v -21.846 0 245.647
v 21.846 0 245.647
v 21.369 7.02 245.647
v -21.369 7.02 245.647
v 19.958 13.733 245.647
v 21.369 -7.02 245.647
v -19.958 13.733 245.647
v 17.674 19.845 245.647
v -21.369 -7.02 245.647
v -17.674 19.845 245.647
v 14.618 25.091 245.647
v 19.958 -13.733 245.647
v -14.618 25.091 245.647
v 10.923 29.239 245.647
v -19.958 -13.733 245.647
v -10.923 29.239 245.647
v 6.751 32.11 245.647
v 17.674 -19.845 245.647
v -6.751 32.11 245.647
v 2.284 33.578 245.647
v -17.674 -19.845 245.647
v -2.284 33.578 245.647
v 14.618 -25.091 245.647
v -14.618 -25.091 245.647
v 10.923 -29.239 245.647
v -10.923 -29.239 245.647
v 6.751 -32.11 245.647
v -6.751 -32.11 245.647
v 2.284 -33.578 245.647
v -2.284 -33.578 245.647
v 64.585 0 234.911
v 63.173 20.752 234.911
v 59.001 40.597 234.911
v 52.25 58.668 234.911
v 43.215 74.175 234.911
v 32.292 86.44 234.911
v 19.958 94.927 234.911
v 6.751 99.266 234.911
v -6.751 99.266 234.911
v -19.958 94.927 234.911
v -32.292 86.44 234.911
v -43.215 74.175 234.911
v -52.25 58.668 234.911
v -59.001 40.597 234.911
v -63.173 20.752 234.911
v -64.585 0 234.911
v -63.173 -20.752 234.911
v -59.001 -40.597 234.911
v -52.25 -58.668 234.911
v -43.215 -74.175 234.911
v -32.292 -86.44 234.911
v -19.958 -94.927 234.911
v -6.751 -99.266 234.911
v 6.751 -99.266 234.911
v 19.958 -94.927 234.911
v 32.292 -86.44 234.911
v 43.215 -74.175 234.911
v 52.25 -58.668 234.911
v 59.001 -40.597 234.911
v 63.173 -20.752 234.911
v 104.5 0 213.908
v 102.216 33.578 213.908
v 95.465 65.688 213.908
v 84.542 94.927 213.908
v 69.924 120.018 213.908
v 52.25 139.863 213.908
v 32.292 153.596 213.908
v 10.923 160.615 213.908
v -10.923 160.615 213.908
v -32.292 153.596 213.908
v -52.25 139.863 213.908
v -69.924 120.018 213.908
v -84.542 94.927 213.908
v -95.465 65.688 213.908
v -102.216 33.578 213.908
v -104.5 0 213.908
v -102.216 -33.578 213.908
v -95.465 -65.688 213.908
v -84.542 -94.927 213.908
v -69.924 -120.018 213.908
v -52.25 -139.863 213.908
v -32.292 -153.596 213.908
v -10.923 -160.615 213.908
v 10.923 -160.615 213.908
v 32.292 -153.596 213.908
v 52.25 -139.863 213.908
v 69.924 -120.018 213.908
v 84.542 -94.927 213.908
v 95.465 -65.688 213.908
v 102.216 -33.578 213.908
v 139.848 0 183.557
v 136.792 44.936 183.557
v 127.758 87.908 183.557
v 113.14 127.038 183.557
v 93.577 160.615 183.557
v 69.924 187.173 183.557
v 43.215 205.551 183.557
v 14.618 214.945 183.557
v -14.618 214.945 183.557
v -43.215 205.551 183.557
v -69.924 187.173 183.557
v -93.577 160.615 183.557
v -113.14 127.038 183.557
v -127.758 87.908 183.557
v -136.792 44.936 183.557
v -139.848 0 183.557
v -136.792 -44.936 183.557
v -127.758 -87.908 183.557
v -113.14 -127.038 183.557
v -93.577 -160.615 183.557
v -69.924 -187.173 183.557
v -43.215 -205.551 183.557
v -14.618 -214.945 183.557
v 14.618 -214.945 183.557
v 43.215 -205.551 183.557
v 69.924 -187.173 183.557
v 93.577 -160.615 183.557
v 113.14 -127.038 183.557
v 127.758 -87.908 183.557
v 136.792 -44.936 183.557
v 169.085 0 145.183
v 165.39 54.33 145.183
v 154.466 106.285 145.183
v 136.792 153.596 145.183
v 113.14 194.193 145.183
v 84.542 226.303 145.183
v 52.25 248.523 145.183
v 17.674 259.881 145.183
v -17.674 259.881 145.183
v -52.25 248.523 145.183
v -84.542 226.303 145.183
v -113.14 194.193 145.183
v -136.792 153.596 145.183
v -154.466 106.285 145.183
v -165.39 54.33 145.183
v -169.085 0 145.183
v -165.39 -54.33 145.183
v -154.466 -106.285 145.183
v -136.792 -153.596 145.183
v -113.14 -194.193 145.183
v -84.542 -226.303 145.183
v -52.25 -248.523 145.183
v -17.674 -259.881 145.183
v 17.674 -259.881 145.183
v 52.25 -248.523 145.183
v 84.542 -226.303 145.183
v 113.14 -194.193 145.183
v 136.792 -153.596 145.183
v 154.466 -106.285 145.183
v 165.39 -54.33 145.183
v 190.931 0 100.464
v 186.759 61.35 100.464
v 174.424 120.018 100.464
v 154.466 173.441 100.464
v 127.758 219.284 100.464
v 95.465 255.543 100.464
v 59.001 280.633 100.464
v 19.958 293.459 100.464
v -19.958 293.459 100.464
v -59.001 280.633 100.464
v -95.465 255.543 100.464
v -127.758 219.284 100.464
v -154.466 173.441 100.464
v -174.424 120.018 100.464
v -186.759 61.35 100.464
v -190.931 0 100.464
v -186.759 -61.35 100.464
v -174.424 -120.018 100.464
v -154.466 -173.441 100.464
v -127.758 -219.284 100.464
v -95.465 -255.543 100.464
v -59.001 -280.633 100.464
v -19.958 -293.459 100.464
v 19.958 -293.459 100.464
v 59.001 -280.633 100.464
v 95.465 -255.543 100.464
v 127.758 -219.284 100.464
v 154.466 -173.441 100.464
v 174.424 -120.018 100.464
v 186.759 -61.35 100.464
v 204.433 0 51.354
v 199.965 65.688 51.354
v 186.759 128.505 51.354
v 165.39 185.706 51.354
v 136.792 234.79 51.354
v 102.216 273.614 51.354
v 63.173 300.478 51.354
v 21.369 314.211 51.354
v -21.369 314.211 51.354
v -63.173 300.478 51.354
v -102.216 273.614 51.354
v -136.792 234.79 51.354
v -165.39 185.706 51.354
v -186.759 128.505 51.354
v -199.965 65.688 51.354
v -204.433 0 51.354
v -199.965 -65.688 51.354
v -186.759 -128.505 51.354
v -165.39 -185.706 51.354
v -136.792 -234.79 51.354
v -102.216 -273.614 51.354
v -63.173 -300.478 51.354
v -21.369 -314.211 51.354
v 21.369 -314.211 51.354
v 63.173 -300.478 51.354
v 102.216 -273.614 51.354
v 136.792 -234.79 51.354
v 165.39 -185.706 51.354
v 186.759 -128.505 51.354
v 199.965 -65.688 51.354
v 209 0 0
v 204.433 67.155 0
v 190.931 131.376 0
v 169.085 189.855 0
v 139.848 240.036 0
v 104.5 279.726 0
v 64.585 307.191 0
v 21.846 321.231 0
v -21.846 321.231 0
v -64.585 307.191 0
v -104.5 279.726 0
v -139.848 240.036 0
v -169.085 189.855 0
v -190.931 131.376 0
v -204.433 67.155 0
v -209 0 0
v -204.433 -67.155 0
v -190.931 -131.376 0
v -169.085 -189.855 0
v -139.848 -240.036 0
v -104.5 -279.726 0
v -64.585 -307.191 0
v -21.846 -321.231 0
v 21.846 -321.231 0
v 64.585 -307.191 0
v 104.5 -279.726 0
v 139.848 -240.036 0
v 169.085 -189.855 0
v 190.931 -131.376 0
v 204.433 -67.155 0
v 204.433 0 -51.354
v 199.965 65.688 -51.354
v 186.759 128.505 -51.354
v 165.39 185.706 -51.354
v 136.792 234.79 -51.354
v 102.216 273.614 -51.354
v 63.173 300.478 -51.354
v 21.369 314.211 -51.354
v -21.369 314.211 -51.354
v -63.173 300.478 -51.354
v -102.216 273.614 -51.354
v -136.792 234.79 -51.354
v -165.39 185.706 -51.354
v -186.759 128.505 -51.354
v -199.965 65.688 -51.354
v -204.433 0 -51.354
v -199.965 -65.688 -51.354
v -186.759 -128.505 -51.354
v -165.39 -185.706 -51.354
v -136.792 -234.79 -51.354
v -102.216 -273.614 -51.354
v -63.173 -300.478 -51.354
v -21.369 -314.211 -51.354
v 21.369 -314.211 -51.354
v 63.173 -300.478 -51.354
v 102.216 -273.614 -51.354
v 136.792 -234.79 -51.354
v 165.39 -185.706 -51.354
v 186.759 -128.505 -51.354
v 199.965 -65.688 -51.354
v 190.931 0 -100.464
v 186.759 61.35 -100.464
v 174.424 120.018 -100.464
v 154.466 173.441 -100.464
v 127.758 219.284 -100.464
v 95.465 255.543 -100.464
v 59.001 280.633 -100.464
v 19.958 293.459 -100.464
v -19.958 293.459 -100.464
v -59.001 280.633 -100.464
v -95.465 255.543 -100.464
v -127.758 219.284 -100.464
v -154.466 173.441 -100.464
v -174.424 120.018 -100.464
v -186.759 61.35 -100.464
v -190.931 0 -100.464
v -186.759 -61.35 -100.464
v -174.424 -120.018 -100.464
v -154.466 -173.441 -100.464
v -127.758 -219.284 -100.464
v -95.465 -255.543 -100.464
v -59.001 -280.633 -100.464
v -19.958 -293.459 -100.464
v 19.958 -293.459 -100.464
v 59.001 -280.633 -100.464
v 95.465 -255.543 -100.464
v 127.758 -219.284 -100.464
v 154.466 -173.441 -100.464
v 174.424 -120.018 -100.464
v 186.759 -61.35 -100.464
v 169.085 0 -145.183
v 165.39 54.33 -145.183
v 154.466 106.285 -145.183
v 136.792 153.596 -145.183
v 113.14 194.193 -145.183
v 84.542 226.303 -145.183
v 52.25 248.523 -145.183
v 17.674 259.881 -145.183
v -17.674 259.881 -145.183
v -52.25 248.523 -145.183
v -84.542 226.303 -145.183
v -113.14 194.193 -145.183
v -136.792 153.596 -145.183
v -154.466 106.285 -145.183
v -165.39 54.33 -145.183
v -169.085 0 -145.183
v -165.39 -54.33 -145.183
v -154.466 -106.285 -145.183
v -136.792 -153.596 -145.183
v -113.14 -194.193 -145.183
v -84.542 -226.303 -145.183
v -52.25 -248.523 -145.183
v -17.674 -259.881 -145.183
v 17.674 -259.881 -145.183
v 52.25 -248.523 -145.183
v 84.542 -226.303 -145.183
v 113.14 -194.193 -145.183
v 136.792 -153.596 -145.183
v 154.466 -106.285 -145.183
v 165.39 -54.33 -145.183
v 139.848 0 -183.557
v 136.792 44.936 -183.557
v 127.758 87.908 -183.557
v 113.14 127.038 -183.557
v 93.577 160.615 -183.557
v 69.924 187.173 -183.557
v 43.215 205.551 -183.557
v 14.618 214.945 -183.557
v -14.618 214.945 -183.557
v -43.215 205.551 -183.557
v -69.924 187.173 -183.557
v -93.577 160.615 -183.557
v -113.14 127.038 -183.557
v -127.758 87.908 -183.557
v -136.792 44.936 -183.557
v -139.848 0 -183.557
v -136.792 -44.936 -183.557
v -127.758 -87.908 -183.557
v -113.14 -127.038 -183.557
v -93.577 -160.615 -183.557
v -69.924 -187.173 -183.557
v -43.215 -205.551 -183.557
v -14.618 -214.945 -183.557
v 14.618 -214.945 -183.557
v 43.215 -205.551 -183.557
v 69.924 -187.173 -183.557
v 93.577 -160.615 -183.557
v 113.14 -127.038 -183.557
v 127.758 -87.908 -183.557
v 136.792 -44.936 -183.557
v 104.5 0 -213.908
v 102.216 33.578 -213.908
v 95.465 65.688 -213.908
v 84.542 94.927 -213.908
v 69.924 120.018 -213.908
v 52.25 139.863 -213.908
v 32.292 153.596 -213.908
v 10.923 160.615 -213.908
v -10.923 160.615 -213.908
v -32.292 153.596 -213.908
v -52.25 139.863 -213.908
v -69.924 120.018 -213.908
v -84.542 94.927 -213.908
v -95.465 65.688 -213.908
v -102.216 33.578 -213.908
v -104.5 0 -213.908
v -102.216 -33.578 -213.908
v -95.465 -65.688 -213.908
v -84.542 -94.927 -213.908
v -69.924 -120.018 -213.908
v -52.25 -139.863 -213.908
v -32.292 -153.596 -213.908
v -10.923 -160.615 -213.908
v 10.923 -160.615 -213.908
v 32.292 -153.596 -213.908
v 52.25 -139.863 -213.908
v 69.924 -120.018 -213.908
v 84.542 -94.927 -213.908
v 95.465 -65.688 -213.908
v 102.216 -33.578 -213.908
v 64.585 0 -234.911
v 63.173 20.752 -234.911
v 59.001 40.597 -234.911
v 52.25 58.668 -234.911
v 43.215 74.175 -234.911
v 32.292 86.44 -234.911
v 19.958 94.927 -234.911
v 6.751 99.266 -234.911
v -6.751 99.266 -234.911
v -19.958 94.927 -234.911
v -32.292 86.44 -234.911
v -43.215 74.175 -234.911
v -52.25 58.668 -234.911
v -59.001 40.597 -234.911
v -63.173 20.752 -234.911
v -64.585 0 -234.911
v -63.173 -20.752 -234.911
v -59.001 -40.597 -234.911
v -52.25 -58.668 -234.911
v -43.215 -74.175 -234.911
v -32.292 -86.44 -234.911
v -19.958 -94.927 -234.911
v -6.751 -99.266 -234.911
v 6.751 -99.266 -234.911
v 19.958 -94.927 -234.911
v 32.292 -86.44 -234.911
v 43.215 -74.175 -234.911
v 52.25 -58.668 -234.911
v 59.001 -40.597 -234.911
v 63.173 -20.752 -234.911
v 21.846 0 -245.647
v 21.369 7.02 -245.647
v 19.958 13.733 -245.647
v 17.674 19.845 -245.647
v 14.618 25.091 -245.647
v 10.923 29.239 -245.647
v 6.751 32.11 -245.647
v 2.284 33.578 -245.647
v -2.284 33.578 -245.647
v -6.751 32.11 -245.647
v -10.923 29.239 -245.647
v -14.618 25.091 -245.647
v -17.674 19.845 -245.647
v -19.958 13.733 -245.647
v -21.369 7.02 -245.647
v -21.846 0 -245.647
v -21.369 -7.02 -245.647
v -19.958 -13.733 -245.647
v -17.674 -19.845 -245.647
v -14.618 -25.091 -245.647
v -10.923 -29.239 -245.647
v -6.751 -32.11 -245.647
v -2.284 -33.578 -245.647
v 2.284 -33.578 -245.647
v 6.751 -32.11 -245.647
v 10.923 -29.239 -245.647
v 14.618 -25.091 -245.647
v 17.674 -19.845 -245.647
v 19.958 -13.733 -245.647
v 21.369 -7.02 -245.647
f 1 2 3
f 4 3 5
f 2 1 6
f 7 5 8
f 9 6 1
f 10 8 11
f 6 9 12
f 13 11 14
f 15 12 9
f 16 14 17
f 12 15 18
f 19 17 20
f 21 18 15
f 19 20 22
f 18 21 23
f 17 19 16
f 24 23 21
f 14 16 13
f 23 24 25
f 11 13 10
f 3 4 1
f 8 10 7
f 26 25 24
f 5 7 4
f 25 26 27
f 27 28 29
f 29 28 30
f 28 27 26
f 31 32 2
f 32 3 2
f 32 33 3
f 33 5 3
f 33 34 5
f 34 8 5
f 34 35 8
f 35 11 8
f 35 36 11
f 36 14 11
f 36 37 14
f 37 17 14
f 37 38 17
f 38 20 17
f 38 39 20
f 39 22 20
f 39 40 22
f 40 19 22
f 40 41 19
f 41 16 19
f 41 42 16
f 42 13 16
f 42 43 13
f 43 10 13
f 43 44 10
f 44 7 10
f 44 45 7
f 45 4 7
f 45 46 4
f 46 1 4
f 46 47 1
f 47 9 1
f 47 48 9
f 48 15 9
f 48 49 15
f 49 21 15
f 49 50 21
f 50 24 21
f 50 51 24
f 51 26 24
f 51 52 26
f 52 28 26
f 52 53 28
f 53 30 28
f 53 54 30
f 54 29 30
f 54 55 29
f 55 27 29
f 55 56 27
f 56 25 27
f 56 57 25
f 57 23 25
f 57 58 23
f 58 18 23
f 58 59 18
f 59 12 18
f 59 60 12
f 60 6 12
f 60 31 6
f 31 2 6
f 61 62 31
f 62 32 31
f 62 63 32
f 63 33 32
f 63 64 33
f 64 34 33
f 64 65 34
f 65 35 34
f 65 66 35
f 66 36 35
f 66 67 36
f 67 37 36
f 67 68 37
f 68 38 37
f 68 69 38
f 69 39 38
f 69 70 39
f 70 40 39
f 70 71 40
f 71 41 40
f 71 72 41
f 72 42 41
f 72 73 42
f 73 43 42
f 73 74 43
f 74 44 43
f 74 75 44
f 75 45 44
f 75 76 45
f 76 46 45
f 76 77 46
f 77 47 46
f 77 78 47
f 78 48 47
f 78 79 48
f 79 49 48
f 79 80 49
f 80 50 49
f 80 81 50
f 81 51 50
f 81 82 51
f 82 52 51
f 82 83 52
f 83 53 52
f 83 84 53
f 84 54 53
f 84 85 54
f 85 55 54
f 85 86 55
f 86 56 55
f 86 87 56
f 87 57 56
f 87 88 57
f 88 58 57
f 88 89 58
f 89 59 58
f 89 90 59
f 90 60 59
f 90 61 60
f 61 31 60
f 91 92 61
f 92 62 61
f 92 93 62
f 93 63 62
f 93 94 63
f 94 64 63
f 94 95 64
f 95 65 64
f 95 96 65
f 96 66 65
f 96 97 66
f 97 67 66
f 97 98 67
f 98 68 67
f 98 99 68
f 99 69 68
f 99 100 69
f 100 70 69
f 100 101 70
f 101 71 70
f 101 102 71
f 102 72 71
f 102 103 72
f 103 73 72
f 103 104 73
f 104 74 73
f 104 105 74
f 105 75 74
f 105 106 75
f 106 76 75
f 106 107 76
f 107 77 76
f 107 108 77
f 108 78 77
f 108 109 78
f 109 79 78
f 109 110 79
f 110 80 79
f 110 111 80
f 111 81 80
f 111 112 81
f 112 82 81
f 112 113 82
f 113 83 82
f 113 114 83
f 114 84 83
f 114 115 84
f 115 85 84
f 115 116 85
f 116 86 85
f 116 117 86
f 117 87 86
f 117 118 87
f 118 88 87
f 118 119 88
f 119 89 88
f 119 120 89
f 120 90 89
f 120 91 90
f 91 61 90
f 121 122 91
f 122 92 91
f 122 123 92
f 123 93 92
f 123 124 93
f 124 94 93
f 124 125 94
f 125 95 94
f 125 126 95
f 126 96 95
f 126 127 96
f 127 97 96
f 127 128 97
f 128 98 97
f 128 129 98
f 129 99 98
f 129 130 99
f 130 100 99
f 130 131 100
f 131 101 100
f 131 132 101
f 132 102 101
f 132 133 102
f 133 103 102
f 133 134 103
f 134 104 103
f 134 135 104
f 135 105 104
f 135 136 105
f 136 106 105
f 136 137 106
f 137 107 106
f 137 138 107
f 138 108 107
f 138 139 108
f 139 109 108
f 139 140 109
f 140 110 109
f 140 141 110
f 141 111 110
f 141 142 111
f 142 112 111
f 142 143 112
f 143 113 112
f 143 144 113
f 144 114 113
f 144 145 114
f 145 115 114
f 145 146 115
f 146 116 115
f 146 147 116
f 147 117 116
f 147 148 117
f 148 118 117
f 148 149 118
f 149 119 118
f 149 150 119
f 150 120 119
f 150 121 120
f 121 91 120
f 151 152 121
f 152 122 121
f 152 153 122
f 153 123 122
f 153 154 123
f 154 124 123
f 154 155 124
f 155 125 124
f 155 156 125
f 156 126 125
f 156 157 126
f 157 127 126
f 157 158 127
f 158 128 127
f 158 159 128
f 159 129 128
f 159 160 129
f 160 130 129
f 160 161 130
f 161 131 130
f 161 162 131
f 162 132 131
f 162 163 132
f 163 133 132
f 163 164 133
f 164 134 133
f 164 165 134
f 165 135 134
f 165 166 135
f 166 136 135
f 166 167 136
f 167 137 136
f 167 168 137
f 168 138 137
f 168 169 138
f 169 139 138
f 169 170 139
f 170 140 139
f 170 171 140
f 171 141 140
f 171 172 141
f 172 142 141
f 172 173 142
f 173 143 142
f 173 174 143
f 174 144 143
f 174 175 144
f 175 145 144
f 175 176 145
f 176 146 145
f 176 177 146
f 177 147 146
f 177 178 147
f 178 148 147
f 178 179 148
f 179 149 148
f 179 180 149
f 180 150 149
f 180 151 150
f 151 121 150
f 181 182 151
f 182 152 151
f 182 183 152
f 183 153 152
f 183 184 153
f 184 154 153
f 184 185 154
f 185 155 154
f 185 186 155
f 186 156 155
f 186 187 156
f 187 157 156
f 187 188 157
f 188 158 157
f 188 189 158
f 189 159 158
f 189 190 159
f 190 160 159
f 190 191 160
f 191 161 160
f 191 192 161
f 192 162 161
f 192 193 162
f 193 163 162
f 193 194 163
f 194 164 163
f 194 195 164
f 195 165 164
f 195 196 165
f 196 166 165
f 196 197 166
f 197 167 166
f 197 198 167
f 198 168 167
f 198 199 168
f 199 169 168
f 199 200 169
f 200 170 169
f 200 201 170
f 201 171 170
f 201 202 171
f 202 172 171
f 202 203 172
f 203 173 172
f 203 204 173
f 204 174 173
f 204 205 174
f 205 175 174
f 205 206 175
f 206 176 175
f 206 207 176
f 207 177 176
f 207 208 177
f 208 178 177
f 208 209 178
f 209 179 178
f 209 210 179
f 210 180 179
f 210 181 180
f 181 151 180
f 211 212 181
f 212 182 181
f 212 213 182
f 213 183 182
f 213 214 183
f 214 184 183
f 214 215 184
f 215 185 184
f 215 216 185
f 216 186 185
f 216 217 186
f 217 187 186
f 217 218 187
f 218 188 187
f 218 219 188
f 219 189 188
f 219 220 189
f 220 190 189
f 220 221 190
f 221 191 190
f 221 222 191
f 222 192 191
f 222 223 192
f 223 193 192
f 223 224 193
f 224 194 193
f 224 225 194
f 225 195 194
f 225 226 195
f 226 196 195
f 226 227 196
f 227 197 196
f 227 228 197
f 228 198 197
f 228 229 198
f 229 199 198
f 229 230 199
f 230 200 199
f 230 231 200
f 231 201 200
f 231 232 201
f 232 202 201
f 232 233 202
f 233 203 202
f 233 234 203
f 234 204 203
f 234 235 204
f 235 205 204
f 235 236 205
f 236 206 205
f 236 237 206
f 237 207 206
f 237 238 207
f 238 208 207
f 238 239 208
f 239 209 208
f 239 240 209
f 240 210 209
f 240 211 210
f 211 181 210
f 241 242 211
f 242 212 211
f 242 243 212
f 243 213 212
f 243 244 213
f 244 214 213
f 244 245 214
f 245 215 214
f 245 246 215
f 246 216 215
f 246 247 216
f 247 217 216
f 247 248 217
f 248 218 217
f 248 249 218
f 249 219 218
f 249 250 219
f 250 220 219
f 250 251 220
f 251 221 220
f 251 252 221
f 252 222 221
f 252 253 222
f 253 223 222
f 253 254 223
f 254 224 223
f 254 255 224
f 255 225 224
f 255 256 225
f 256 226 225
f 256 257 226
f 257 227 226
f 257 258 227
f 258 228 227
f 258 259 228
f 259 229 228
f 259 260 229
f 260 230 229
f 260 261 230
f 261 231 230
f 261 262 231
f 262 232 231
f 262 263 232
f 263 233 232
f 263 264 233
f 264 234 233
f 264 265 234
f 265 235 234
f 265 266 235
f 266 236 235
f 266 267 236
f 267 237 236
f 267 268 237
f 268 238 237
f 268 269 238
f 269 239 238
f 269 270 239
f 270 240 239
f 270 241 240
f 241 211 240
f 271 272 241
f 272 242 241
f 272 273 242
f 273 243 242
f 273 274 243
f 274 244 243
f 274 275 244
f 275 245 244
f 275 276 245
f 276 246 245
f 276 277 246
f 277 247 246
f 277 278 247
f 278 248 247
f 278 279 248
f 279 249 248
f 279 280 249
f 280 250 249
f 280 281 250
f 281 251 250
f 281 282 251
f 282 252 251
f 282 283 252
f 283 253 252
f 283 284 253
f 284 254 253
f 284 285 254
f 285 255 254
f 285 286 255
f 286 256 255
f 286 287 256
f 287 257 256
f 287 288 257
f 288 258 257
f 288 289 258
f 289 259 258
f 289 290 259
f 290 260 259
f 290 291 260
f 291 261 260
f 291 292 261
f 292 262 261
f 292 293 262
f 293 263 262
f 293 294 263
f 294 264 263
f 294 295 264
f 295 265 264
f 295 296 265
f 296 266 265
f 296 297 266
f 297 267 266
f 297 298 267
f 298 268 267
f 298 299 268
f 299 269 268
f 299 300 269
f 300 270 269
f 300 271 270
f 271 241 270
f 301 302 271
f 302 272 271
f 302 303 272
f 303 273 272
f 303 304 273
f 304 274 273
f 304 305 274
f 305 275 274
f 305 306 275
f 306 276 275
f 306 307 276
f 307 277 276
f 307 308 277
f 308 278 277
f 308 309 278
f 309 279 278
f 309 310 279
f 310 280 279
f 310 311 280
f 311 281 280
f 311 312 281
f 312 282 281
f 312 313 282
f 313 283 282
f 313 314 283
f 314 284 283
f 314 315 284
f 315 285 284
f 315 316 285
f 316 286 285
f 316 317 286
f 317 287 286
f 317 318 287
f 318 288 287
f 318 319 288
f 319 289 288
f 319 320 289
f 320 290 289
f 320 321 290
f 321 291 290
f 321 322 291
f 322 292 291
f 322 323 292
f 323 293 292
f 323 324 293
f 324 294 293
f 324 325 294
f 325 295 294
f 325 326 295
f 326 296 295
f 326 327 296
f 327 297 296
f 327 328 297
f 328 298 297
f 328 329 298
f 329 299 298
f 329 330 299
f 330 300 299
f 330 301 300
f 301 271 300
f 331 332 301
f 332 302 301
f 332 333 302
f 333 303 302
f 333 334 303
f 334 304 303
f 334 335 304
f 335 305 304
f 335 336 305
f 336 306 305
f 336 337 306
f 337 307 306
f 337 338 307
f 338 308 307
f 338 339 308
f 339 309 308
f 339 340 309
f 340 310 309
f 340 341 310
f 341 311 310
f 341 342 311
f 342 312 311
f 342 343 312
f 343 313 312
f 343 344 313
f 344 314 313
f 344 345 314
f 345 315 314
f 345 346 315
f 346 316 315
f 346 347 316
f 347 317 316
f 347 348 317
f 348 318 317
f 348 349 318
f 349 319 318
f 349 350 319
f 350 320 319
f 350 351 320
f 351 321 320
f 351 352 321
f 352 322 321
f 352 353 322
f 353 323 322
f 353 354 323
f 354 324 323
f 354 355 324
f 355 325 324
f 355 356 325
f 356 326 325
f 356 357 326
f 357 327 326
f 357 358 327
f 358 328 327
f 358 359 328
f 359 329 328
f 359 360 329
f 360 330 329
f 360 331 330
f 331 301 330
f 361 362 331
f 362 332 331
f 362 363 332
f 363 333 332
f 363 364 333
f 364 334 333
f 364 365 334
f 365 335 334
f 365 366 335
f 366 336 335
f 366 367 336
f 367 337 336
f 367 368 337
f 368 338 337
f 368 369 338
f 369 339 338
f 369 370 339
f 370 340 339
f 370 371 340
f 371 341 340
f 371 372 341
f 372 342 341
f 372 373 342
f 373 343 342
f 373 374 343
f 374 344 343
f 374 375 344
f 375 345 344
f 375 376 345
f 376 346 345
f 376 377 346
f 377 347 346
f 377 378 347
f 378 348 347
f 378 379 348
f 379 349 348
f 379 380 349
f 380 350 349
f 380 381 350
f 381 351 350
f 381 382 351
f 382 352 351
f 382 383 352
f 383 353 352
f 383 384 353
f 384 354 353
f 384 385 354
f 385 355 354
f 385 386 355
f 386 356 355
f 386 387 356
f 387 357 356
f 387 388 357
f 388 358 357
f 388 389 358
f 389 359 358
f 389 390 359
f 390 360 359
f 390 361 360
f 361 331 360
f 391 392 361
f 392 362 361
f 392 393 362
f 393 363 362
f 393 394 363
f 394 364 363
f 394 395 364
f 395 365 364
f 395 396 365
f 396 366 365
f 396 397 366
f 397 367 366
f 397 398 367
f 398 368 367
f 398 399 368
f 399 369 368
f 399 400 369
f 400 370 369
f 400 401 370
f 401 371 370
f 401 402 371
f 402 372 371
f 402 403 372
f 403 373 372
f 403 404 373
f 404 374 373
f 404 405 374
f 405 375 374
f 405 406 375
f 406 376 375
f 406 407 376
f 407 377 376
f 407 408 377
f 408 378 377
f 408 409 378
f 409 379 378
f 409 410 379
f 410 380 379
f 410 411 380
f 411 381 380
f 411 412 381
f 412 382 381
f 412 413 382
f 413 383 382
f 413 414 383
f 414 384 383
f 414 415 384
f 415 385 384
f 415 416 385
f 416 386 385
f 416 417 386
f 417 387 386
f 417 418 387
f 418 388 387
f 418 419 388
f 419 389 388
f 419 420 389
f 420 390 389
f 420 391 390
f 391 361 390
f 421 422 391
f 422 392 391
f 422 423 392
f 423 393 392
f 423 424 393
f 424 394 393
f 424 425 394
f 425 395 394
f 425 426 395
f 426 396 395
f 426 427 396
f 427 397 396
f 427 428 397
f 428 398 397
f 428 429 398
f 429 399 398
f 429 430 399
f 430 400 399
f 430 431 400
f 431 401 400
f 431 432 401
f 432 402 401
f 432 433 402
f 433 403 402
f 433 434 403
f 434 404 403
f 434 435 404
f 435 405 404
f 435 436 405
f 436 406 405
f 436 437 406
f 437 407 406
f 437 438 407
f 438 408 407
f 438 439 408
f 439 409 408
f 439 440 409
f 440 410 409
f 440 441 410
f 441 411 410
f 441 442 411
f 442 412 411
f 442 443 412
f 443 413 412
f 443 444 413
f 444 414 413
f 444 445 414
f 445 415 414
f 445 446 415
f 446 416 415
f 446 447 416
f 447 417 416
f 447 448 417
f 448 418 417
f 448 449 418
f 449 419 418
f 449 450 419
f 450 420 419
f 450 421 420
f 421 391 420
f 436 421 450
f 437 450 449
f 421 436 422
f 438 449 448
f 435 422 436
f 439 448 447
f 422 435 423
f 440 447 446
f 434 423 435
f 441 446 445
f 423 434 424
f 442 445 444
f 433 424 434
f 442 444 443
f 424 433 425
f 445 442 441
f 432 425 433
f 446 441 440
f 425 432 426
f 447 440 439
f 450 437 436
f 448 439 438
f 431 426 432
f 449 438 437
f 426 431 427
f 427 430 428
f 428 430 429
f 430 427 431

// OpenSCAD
// Generated by SolidPython 1.0.1 on 2020-07-29 00:46:50


scale(v = [11, 17, 13]) {
	sphere(r = 19);
}
/***********************************************
*********      SolidPython code:      **********
************************************************
 
# import packages: SolidPython
from solid import *
from solid.utils import *
from itertools import chain, combinations, permutations


class Resize:

    def __init__(self, scad_file):
        self.scad_file = scad_file
        #self.scad_file = import_scad(scad_file)
        # cone/cylinder param:
        self.r1 = 0
        self.r2 = 0
        self.h = 0
        # rectangular prism param:
        self.w = 0
        self.l = 0
        # ellipse param:
        self.r = 0

    # import OpenScad code (file name corresponds to shape)


    # classify shape + parameters
    def assign(self, param1, param2, param3):
        if self.scad_file == 'cone.scad':
            self.r1 = param1
            self.r2 = param2
            self.h = param3
        elif self.scad_file == 'cylinder.scad':
            self.r1 = param1
            self.r2 = param2
            self.h = param3
        elif self.scad_file == 'rectangularPrism.scad':
            self.h = param1
            self.l = param2
            self.w = param3
        else:
            self.r = param1
            self.h = param2

    # resize parameters
    def iterate(self):
        x = range(3, 20, 2)
        i = 1
        if self.scad_file == 'cone.scad':
            tempList = list(permutations(x, 2))
            for temp in tempList:
                param1 = temp[0]
                param2 = temp[1]
                filepath = 'produced_scad_files/' + 'cone' + str(param1) + '_' + str(param2) + '_' + '.scad'
                scad_render_to_file(cylinder(h=param1, r1=param2, r2=0), filepath)

        elif self.scad_file == 'cylinder.scad':
            tempList = list(permutations(x, 3))
            for temp in tempList:
                param1 = temp[0]
                param2 = temp[1]
                filepath = 'produced_scad_files/' + 'cylinder' + str(param1) + '_' + str(param2) + '_' + '.scad'
                scad_render_to_file(cylinder(h=param1, r1=param2, r2=param2), filepath)

        elif self.scad_file == 'rectangularPrism.scad':
            tempList = list(permutations(x, 3))
            for temp in tempList:
                param1 = temp[0]
                param2 = temp[1]
                param3 = temp[2]
                filepath = 'produced_scad_files/' + 'rectangularPrism' + str(param1) + '_' + str(param2) + '_' + str(
                    param3) + '.scad'
                scad_render_to_file(cube(size=(param1, param2, param3)), filepath)

        elif self.scad_file == 'ellipse.scad':
            tempList = list(permutations(x, 4))
            for temp in tempList:
                param1 = temp[0]
                param2 = temp[1]
                param3 = temp[2]
                param4 = temp[3]
                filepath = 'produced_scad_files/' + 'ellipse' + str(param1) + '_' + str(param2) + '_' + str(param3) + '_' + str(param4) + '.scad'
                scad_render_to_file(scale([param1, param2, param3])(sphere(r=param4)), filepath)

    def render_to_scadfile(self):
        scad_render_to_file(scad, 'example.scad') 
 
************************************************/
